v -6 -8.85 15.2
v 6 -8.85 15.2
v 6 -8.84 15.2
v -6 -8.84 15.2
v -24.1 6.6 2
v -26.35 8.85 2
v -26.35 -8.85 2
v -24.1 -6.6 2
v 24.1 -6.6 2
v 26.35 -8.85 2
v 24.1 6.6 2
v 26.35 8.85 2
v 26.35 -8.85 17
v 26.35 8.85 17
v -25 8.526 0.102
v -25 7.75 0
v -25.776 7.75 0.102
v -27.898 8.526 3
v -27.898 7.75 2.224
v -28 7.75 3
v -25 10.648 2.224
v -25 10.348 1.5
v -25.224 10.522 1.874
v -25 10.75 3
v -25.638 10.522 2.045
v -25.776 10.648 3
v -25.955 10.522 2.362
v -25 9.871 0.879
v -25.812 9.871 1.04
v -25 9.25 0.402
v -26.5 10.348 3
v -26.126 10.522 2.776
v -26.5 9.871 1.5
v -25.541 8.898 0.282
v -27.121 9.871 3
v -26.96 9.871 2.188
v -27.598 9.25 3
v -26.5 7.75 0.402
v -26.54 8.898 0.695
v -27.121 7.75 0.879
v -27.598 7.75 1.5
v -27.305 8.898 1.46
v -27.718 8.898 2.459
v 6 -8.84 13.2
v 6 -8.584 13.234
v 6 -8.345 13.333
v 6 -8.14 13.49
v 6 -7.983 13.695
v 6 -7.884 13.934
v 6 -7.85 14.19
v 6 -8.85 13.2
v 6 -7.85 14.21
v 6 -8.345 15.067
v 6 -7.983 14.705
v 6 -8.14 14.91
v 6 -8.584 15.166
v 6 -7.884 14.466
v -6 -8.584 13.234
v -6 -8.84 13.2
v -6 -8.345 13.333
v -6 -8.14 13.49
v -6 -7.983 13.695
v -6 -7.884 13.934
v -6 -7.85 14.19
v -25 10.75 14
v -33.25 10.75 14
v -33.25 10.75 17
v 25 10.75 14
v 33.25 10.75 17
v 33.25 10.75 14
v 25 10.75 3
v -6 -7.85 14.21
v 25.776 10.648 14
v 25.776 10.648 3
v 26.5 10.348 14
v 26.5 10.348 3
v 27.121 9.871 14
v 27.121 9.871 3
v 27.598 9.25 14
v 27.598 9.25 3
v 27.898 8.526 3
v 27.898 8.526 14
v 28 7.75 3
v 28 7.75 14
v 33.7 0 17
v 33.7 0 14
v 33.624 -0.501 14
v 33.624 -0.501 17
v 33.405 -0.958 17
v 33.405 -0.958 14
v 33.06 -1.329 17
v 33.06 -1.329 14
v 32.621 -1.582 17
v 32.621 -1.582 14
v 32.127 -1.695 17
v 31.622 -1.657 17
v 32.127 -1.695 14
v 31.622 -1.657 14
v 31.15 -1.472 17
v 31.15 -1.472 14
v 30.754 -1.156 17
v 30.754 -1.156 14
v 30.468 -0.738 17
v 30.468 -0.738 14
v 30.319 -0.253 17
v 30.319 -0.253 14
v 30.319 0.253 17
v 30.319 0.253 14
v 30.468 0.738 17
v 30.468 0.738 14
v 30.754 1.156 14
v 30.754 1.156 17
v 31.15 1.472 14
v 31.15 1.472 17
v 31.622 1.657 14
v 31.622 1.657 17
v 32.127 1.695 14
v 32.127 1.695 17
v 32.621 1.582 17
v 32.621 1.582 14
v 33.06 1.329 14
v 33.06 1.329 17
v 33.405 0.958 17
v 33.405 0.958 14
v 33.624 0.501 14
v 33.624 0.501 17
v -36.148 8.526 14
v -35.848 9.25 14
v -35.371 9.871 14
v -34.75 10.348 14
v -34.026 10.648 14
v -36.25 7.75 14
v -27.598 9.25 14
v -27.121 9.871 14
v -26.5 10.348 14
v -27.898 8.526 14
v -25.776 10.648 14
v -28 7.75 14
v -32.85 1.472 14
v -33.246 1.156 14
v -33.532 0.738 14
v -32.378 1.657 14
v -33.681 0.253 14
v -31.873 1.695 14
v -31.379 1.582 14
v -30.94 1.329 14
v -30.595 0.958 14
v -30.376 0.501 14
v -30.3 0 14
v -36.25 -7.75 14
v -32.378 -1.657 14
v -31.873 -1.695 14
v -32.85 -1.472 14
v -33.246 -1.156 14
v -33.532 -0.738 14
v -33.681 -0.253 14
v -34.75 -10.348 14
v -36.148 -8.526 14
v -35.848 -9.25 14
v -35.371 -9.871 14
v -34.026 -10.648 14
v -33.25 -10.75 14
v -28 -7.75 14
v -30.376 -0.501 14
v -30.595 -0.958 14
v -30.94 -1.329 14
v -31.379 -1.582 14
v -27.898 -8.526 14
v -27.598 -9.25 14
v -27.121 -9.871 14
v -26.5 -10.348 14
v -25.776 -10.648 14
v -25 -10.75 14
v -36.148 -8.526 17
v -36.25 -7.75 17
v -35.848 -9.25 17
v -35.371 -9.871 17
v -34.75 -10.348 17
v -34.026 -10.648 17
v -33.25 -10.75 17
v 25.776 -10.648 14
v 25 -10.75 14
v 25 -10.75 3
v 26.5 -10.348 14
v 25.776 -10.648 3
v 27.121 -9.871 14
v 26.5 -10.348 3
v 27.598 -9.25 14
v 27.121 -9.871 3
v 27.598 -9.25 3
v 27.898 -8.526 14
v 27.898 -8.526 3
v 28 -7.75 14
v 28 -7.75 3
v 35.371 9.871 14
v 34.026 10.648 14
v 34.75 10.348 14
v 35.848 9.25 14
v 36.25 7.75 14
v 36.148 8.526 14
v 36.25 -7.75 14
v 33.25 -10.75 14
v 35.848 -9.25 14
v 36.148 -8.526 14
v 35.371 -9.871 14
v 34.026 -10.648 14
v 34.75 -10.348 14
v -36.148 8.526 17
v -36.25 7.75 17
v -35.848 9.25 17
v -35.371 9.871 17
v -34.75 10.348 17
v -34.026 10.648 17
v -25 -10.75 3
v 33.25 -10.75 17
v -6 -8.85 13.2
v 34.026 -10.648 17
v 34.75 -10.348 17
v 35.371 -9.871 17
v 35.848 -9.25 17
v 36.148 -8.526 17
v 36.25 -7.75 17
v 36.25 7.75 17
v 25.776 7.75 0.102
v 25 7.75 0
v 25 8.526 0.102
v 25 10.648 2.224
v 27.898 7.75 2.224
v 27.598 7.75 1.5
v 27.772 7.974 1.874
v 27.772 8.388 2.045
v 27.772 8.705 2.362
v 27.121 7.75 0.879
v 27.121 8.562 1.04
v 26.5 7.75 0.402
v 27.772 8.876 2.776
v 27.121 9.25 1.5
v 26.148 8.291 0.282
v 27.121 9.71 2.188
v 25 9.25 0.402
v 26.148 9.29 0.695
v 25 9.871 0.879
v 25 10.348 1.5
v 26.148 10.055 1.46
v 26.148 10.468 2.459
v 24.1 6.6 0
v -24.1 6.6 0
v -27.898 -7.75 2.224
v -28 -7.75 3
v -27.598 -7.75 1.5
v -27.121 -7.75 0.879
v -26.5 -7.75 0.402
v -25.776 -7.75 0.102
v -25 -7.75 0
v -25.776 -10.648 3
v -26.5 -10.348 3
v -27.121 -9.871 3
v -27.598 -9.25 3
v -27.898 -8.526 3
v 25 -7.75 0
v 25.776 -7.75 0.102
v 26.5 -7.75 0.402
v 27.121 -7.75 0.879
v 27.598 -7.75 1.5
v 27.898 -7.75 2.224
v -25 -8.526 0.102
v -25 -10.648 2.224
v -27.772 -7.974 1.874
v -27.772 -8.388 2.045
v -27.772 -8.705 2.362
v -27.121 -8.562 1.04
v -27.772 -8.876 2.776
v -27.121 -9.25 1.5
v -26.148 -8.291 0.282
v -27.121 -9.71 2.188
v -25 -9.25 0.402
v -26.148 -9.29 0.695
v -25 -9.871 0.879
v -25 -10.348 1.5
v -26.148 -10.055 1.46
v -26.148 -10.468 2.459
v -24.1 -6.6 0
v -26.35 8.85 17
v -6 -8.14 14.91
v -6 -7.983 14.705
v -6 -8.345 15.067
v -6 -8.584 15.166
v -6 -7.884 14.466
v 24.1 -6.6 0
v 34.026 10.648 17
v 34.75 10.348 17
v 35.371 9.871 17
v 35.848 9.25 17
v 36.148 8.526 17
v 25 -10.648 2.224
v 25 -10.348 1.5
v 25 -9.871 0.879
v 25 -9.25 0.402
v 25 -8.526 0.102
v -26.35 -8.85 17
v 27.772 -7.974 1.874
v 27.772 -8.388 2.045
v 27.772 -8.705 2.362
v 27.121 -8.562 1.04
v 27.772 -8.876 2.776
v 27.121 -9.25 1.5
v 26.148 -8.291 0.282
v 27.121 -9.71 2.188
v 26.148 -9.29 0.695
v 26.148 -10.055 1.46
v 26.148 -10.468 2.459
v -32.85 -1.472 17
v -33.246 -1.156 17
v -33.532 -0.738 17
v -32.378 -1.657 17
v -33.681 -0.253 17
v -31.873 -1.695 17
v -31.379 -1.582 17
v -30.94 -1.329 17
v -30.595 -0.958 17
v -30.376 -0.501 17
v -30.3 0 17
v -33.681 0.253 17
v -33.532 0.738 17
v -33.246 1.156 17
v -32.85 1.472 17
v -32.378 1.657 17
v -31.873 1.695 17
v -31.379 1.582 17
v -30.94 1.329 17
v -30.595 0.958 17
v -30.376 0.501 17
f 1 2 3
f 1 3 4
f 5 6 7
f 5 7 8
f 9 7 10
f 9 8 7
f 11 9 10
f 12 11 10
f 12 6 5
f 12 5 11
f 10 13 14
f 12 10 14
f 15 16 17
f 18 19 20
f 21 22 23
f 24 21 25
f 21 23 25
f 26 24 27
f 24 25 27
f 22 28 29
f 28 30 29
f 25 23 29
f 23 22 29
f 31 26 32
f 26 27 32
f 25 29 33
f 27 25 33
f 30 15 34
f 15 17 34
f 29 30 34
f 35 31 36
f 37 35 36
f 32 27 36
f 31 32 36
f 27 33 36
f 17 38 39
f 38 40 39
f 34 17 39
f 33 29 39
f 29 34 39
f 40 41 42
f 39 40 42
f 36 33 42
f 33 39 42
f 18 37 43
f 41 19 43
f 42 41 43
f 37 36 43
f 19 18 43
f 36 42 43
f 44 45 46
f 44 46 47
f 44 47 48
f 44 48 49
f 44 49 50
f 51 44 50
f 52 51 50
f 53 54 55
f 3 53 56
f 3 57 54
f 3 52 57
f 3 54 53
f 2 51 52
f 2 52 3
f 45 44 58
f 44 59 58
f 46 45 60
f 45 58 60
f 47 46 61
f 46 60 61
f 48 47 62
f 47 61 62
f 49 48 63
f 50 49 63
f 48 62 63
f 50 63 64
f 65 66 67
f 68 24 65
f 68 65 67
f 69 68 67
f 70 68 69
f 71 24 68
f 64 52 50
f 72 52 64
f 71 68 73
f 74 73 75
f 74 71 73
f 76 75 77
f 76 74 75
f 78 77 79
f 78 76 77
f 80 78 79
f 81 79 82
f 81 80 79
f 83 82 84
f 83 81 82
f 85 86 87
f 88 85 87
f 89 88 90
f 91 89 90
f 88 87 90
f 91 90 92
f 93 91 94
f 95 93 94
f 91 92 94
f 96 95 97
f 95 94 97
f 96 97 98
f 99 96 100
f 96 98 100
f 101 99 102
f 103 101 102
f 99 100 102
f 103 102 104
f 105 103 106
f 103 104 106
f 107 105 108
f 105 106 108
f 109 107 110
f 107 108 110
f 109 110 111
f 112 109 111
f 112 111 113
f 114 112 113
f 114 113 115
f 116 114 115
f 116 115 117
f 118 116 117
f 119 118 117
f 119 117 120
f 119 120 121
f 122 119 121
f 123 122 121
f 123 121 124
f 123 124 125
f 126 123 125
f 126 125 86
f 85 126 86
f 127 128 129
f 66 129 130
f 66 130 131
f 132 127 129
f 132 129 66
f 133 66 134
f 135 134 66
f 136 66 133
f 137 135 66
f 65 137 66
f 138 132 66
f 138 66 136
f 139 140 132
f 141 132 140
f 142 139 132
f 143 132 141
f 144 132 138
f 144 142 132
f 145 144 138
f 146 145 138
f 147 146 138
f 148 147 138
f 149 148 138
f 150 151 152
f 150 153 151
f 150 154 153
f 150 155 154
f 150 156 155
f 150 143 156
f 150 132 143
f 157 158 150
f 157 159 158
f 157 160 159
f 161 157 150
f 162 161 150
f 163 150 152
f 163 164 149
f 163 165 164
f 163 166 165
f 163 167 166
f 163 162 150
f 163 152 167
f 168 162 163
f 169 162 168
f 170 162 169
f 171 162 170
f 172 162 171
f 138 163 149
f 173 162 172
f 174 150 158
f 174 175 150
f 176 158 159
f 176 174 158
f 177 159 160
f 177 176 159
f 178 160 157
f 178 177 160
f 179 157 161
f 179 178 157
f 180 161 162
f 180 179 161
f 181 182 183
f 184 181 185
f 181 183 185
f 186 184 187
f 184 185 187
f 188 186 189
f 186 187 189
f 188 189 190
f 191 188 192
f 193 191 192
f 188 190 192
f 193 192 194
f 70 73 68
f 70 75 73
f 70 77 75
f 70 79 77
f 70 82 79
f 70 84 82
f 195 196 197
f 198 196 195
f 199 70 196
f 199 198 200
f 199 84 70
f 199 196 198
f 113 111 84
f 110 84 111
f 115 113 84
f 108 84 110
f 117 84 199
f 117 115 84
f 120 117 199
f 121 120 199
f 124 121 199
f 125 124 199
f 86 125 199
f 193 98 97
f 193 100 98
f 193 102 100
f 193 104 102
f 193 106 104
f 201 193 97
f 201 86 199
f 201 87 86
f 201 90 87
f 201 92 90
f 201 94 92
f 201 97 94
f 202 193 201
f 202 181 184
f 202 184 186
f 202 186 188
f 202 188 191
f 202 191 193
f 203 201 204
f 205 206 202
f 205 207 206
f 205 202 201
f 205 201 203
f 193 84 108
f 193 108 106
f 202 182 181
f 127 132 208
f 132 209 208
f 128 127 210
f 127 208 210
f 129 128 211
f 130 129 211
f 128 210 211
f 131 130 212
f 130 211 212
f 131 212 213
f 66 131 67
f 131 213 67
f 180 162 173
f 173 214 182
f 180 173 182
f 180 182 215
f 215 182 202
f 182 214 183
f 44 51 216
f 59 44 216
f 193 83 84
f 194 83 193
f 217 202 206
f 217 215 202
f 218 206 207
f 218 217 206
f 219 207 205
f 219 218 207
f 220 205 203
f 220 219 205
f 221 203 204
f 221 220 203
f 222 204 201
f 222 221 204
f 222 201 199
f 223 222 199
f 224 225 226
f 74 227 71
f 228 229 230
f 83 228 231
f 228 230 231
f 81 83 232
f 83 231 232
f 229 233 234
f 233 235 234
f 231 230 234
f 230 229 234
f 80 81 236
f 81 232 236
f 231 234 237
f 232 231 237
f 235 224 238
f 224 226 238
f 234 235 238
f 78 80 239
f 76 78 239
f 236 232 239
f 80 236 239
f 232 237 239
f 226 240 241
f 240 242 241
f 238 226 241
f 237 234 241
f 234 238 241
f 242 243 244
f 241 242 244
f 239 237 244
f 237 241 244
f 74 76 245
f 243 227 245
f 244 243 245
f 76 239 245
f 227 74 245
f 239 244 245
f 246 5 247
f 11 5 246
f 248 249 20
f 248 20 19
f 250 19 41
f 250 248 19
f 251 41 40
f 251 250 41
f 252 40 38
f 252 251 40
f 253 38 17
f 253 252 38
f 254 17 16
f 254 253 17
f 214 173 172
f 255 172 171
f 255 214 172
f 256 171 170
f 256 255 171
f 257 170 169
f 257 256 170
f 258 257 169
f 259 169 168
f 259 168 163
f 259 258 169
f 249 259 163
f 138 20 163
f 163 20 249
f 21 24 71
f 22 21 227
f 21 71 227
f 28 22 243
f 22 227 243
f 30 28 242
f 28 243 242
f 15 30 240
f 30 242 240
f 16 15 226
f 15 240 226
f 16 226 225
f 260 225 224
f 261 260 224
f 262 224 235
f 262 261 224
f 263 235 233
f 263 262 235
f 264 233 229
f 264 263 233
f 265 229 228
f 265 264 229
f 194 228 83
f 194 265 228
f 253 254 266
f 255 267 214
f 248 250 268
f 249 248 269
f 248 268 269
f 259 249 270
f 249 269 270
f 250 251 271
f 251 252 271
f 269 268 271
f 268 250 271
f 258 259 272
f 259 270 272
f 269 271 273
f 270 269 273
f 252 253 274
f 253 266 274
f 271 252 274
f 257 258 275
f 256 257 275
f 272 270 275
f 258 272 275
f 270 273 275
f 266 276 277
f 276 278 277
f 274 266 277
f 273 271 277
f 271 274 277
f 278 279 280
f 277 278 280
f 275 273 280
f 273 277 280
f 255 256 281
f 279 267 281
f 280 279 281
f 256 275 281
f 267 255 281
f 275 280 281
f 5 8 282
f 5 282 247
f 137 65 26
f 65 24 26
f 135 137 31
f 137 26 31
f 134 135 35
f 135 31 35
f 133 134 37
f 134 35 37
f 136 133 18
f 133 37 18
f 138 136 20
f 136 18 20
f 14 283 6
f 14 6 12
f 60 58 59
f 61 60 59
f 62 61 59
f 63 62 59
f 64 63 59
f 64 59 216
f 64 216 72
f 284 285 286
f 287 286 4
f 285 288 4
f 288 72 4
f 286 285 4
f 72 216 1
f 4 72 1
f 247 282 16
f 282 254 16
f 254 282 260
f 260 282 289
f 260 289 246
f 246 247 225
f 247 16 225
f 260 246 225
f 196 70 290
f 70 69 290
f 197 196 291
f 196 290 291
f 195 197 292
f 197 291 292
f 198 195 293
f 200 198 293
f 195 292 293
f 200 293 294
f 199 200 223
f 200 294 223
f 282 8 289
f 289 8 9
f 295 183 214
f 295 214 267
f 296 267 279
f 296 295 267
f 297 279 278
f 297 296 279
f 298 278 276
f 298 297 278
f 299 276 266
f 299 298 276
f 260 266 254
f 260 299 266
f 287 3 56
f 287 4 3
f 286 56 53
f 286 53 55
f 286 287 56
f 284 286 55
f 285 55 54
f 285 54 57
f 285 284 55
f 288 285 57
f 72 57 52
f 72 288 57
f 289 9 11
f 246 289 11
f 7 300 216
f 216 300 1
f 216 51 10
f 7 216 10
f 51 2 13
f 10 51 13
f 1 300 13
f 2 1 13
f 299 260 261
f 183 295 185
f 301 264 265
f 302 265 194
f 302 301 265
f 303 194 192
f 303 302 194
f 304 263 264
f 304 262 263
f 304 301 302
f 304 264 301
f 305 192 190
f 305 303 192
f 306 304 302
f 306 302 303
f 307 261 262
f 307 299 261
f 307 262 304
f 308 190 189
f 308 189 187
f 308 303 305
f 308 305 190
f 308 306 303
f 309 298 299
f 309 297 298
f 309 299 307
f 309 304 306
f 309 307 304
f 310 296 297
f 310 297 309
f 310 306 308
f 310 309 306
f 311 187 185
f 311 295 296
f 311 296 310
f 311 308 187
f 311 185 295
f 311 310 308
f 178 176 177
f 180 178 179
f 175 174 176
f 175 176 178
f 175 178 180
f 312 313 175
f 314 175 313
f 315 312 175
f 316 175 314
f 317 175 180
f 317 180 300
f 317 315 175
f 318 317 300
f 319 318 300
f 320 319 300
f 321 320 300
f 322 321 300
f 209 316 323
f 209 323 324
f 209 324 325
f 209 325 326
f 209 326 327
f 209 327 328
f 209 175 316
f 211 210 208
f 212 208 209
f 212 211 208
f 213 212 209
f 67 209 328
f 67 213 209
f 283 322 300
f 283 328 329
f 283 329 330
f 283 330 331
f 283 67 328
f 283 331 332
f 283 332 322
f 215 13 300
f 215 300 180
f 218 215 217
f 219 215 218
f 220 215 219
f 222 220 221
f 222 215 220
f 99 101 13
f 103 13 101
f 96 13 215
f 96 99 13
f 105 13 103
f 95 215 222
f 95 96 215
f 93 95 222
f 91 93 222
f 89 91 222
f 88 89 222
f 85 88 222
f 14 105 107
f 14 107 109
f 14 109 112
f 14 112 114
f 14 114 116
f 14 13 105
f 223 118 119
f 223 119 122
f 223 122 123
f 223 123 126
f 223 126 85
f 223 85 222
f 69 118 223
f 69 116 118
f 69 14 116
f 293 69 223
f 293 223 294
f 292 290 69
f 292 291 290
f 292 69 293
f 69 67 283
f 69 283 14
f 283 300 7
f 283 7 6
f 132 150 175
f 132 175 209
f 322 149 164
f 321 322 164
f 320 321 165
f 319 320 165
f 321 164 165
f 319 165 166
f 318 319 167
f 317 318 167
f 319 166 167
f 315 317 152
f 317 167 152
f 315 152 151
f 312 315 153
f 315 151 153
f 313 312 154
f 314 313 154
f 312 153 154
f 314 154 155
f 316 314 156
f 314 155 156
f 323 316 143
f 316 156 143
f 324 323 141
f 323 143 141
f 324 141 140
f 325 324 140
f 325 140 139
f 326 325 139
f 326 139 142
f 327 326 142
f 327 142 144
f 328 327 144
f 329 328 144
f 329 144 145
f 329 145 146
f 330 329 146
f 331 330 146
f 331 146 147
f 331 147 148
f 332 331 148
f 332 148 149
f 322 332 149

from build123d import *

# Parameters (mm, degrees)
SKETCH_W        = 72.5
SKETCH_H        = 21.5
PAD_DEPTH       = 17
SKETCH001_W     = 52.7
SKETCH001_H     = 17.7
POCKET_DEPTH    = 15
SKETCH002_W     = 48.2
SKETCH002_H     = 13.2
POCKET001_DEPTH = 5
SKETCH003_W     = 10
SKETCH003_H     = 28.534706
SKETCH003_W_2   = 11.202904
SKETCH003_H_2   = 28.537951
POCKET002_DEPTH = 14
SKETCH004_R     = 1.7
POCKET003_DEPTH = 5
SKETCH005_W     = 12
SKETCH005_H     = 2
PAD001_DEPTH    = 1
FILLET_R        = 0.99
FILLET001_R     = 3
FILLET002_R     = 3


with BuildPart() as part:
    # Sketch → Pad (new body)
    with BuildSketch(Plane.XY):
        Rectangle(SKETCH_W, SKETCH_H)
    extrude(amount=PAD_DEPTH)

    # Sketch001 → Pocket (cut)
    with BuildSketch(Plane.XY.offset(17)):
        Rectangle(SKETCH001_W, SKETCH001_H)
    extrude(amount=-POCKET_DEPTH, mode=Mode.SUBTRACT)

    # Sketch002 → Pocket001 (cut)
    with BuildSketch(Plane.XY.offset(2)):
        Rectangle(SKETCH002_W, SKETCH002_H)
    extrude(amount=-POCKET001_DEPTH, mode=Mode.SUBTRACT)

    # Sketch003 → Pocket002 (cut)
    with BuildSketch(Plane(origin=(0, 0, 0), x_dir=(1, 0, 0), z_dir=(0, 0, -1))):
        with Locations((-33, -0.267353)):
            Rectangle(SKETCH003_W, SKETCH003_H)
        with Locations((33.601452, -0.268975)):
            Rectangle(SKETCH003_W_2, SKETCH003_H_2)
    extrude(amount=-POCKET002_DEPTH, mode=Mode.SUBTRACT)

    # Sketch004 → Pocket003 (cut)
    with BuildSketch(Plane(origin=(0, 0, 14), x_dir=(1, 0, 0), z_dir=(0, 0, -1))):
        with Locations((32, 0)):
            Circle(SKETCH004_R)
        with Locations((-32, 0)):
            Circle(SKETCH004_R)
    extrude(amount=-POCKET003_DEPTH, mode=Mode.SUBTRACT)

    # Sketch005 → Pad001 (new body)
    with BuildSketch(Plane(origin=(0, -8.85, 0), x_dir=(-1, 0, 0), z_dir=(0, 1, 0))):
        with Locations((0, 14.2)):
            Rectangle(SKETCH005_W, SKETCH005_H)
    extrude(amount=PAD001_DEPTH)

    # Fillet
    fillet_edges = [part.edges().sort_by_distance(p)[0] for p in [
        (0, -7.85, 15.2),
        (0, -7.85, 13.2),
    ]]
    fillet(fillet_edges, radius=FILLET_R)

    # Fillet001
    fillet001_edges = [part.edges().sort_by_distance(p)[0] for p in [
        (36.25, 10.75, 15.5),
        (36.25, -10.75, 15.5),
        (-36.25, 10.75, 15.5),
        (-36.25, -10.75, 15.5),
    ]]
    fillet(fillet001_edges, radius=FILLET001_R)

    # Fillet002
    fillet002_edges = [part.edges().sort_by_distance(p)[0] for p in [
        (0, -10.75, 0),
        (-28, 0, 0),
        (0, 10.75, 0),
        (28, 0, 0),
        (28, 10.75, 7),
        (28, -10.75, 7),
        (-28, -10.75, 7),
        (-28, 10.75, 7),
    ]]
    fillet(fillet002_edges, radius=FILLET002_R)


solid = part.part
